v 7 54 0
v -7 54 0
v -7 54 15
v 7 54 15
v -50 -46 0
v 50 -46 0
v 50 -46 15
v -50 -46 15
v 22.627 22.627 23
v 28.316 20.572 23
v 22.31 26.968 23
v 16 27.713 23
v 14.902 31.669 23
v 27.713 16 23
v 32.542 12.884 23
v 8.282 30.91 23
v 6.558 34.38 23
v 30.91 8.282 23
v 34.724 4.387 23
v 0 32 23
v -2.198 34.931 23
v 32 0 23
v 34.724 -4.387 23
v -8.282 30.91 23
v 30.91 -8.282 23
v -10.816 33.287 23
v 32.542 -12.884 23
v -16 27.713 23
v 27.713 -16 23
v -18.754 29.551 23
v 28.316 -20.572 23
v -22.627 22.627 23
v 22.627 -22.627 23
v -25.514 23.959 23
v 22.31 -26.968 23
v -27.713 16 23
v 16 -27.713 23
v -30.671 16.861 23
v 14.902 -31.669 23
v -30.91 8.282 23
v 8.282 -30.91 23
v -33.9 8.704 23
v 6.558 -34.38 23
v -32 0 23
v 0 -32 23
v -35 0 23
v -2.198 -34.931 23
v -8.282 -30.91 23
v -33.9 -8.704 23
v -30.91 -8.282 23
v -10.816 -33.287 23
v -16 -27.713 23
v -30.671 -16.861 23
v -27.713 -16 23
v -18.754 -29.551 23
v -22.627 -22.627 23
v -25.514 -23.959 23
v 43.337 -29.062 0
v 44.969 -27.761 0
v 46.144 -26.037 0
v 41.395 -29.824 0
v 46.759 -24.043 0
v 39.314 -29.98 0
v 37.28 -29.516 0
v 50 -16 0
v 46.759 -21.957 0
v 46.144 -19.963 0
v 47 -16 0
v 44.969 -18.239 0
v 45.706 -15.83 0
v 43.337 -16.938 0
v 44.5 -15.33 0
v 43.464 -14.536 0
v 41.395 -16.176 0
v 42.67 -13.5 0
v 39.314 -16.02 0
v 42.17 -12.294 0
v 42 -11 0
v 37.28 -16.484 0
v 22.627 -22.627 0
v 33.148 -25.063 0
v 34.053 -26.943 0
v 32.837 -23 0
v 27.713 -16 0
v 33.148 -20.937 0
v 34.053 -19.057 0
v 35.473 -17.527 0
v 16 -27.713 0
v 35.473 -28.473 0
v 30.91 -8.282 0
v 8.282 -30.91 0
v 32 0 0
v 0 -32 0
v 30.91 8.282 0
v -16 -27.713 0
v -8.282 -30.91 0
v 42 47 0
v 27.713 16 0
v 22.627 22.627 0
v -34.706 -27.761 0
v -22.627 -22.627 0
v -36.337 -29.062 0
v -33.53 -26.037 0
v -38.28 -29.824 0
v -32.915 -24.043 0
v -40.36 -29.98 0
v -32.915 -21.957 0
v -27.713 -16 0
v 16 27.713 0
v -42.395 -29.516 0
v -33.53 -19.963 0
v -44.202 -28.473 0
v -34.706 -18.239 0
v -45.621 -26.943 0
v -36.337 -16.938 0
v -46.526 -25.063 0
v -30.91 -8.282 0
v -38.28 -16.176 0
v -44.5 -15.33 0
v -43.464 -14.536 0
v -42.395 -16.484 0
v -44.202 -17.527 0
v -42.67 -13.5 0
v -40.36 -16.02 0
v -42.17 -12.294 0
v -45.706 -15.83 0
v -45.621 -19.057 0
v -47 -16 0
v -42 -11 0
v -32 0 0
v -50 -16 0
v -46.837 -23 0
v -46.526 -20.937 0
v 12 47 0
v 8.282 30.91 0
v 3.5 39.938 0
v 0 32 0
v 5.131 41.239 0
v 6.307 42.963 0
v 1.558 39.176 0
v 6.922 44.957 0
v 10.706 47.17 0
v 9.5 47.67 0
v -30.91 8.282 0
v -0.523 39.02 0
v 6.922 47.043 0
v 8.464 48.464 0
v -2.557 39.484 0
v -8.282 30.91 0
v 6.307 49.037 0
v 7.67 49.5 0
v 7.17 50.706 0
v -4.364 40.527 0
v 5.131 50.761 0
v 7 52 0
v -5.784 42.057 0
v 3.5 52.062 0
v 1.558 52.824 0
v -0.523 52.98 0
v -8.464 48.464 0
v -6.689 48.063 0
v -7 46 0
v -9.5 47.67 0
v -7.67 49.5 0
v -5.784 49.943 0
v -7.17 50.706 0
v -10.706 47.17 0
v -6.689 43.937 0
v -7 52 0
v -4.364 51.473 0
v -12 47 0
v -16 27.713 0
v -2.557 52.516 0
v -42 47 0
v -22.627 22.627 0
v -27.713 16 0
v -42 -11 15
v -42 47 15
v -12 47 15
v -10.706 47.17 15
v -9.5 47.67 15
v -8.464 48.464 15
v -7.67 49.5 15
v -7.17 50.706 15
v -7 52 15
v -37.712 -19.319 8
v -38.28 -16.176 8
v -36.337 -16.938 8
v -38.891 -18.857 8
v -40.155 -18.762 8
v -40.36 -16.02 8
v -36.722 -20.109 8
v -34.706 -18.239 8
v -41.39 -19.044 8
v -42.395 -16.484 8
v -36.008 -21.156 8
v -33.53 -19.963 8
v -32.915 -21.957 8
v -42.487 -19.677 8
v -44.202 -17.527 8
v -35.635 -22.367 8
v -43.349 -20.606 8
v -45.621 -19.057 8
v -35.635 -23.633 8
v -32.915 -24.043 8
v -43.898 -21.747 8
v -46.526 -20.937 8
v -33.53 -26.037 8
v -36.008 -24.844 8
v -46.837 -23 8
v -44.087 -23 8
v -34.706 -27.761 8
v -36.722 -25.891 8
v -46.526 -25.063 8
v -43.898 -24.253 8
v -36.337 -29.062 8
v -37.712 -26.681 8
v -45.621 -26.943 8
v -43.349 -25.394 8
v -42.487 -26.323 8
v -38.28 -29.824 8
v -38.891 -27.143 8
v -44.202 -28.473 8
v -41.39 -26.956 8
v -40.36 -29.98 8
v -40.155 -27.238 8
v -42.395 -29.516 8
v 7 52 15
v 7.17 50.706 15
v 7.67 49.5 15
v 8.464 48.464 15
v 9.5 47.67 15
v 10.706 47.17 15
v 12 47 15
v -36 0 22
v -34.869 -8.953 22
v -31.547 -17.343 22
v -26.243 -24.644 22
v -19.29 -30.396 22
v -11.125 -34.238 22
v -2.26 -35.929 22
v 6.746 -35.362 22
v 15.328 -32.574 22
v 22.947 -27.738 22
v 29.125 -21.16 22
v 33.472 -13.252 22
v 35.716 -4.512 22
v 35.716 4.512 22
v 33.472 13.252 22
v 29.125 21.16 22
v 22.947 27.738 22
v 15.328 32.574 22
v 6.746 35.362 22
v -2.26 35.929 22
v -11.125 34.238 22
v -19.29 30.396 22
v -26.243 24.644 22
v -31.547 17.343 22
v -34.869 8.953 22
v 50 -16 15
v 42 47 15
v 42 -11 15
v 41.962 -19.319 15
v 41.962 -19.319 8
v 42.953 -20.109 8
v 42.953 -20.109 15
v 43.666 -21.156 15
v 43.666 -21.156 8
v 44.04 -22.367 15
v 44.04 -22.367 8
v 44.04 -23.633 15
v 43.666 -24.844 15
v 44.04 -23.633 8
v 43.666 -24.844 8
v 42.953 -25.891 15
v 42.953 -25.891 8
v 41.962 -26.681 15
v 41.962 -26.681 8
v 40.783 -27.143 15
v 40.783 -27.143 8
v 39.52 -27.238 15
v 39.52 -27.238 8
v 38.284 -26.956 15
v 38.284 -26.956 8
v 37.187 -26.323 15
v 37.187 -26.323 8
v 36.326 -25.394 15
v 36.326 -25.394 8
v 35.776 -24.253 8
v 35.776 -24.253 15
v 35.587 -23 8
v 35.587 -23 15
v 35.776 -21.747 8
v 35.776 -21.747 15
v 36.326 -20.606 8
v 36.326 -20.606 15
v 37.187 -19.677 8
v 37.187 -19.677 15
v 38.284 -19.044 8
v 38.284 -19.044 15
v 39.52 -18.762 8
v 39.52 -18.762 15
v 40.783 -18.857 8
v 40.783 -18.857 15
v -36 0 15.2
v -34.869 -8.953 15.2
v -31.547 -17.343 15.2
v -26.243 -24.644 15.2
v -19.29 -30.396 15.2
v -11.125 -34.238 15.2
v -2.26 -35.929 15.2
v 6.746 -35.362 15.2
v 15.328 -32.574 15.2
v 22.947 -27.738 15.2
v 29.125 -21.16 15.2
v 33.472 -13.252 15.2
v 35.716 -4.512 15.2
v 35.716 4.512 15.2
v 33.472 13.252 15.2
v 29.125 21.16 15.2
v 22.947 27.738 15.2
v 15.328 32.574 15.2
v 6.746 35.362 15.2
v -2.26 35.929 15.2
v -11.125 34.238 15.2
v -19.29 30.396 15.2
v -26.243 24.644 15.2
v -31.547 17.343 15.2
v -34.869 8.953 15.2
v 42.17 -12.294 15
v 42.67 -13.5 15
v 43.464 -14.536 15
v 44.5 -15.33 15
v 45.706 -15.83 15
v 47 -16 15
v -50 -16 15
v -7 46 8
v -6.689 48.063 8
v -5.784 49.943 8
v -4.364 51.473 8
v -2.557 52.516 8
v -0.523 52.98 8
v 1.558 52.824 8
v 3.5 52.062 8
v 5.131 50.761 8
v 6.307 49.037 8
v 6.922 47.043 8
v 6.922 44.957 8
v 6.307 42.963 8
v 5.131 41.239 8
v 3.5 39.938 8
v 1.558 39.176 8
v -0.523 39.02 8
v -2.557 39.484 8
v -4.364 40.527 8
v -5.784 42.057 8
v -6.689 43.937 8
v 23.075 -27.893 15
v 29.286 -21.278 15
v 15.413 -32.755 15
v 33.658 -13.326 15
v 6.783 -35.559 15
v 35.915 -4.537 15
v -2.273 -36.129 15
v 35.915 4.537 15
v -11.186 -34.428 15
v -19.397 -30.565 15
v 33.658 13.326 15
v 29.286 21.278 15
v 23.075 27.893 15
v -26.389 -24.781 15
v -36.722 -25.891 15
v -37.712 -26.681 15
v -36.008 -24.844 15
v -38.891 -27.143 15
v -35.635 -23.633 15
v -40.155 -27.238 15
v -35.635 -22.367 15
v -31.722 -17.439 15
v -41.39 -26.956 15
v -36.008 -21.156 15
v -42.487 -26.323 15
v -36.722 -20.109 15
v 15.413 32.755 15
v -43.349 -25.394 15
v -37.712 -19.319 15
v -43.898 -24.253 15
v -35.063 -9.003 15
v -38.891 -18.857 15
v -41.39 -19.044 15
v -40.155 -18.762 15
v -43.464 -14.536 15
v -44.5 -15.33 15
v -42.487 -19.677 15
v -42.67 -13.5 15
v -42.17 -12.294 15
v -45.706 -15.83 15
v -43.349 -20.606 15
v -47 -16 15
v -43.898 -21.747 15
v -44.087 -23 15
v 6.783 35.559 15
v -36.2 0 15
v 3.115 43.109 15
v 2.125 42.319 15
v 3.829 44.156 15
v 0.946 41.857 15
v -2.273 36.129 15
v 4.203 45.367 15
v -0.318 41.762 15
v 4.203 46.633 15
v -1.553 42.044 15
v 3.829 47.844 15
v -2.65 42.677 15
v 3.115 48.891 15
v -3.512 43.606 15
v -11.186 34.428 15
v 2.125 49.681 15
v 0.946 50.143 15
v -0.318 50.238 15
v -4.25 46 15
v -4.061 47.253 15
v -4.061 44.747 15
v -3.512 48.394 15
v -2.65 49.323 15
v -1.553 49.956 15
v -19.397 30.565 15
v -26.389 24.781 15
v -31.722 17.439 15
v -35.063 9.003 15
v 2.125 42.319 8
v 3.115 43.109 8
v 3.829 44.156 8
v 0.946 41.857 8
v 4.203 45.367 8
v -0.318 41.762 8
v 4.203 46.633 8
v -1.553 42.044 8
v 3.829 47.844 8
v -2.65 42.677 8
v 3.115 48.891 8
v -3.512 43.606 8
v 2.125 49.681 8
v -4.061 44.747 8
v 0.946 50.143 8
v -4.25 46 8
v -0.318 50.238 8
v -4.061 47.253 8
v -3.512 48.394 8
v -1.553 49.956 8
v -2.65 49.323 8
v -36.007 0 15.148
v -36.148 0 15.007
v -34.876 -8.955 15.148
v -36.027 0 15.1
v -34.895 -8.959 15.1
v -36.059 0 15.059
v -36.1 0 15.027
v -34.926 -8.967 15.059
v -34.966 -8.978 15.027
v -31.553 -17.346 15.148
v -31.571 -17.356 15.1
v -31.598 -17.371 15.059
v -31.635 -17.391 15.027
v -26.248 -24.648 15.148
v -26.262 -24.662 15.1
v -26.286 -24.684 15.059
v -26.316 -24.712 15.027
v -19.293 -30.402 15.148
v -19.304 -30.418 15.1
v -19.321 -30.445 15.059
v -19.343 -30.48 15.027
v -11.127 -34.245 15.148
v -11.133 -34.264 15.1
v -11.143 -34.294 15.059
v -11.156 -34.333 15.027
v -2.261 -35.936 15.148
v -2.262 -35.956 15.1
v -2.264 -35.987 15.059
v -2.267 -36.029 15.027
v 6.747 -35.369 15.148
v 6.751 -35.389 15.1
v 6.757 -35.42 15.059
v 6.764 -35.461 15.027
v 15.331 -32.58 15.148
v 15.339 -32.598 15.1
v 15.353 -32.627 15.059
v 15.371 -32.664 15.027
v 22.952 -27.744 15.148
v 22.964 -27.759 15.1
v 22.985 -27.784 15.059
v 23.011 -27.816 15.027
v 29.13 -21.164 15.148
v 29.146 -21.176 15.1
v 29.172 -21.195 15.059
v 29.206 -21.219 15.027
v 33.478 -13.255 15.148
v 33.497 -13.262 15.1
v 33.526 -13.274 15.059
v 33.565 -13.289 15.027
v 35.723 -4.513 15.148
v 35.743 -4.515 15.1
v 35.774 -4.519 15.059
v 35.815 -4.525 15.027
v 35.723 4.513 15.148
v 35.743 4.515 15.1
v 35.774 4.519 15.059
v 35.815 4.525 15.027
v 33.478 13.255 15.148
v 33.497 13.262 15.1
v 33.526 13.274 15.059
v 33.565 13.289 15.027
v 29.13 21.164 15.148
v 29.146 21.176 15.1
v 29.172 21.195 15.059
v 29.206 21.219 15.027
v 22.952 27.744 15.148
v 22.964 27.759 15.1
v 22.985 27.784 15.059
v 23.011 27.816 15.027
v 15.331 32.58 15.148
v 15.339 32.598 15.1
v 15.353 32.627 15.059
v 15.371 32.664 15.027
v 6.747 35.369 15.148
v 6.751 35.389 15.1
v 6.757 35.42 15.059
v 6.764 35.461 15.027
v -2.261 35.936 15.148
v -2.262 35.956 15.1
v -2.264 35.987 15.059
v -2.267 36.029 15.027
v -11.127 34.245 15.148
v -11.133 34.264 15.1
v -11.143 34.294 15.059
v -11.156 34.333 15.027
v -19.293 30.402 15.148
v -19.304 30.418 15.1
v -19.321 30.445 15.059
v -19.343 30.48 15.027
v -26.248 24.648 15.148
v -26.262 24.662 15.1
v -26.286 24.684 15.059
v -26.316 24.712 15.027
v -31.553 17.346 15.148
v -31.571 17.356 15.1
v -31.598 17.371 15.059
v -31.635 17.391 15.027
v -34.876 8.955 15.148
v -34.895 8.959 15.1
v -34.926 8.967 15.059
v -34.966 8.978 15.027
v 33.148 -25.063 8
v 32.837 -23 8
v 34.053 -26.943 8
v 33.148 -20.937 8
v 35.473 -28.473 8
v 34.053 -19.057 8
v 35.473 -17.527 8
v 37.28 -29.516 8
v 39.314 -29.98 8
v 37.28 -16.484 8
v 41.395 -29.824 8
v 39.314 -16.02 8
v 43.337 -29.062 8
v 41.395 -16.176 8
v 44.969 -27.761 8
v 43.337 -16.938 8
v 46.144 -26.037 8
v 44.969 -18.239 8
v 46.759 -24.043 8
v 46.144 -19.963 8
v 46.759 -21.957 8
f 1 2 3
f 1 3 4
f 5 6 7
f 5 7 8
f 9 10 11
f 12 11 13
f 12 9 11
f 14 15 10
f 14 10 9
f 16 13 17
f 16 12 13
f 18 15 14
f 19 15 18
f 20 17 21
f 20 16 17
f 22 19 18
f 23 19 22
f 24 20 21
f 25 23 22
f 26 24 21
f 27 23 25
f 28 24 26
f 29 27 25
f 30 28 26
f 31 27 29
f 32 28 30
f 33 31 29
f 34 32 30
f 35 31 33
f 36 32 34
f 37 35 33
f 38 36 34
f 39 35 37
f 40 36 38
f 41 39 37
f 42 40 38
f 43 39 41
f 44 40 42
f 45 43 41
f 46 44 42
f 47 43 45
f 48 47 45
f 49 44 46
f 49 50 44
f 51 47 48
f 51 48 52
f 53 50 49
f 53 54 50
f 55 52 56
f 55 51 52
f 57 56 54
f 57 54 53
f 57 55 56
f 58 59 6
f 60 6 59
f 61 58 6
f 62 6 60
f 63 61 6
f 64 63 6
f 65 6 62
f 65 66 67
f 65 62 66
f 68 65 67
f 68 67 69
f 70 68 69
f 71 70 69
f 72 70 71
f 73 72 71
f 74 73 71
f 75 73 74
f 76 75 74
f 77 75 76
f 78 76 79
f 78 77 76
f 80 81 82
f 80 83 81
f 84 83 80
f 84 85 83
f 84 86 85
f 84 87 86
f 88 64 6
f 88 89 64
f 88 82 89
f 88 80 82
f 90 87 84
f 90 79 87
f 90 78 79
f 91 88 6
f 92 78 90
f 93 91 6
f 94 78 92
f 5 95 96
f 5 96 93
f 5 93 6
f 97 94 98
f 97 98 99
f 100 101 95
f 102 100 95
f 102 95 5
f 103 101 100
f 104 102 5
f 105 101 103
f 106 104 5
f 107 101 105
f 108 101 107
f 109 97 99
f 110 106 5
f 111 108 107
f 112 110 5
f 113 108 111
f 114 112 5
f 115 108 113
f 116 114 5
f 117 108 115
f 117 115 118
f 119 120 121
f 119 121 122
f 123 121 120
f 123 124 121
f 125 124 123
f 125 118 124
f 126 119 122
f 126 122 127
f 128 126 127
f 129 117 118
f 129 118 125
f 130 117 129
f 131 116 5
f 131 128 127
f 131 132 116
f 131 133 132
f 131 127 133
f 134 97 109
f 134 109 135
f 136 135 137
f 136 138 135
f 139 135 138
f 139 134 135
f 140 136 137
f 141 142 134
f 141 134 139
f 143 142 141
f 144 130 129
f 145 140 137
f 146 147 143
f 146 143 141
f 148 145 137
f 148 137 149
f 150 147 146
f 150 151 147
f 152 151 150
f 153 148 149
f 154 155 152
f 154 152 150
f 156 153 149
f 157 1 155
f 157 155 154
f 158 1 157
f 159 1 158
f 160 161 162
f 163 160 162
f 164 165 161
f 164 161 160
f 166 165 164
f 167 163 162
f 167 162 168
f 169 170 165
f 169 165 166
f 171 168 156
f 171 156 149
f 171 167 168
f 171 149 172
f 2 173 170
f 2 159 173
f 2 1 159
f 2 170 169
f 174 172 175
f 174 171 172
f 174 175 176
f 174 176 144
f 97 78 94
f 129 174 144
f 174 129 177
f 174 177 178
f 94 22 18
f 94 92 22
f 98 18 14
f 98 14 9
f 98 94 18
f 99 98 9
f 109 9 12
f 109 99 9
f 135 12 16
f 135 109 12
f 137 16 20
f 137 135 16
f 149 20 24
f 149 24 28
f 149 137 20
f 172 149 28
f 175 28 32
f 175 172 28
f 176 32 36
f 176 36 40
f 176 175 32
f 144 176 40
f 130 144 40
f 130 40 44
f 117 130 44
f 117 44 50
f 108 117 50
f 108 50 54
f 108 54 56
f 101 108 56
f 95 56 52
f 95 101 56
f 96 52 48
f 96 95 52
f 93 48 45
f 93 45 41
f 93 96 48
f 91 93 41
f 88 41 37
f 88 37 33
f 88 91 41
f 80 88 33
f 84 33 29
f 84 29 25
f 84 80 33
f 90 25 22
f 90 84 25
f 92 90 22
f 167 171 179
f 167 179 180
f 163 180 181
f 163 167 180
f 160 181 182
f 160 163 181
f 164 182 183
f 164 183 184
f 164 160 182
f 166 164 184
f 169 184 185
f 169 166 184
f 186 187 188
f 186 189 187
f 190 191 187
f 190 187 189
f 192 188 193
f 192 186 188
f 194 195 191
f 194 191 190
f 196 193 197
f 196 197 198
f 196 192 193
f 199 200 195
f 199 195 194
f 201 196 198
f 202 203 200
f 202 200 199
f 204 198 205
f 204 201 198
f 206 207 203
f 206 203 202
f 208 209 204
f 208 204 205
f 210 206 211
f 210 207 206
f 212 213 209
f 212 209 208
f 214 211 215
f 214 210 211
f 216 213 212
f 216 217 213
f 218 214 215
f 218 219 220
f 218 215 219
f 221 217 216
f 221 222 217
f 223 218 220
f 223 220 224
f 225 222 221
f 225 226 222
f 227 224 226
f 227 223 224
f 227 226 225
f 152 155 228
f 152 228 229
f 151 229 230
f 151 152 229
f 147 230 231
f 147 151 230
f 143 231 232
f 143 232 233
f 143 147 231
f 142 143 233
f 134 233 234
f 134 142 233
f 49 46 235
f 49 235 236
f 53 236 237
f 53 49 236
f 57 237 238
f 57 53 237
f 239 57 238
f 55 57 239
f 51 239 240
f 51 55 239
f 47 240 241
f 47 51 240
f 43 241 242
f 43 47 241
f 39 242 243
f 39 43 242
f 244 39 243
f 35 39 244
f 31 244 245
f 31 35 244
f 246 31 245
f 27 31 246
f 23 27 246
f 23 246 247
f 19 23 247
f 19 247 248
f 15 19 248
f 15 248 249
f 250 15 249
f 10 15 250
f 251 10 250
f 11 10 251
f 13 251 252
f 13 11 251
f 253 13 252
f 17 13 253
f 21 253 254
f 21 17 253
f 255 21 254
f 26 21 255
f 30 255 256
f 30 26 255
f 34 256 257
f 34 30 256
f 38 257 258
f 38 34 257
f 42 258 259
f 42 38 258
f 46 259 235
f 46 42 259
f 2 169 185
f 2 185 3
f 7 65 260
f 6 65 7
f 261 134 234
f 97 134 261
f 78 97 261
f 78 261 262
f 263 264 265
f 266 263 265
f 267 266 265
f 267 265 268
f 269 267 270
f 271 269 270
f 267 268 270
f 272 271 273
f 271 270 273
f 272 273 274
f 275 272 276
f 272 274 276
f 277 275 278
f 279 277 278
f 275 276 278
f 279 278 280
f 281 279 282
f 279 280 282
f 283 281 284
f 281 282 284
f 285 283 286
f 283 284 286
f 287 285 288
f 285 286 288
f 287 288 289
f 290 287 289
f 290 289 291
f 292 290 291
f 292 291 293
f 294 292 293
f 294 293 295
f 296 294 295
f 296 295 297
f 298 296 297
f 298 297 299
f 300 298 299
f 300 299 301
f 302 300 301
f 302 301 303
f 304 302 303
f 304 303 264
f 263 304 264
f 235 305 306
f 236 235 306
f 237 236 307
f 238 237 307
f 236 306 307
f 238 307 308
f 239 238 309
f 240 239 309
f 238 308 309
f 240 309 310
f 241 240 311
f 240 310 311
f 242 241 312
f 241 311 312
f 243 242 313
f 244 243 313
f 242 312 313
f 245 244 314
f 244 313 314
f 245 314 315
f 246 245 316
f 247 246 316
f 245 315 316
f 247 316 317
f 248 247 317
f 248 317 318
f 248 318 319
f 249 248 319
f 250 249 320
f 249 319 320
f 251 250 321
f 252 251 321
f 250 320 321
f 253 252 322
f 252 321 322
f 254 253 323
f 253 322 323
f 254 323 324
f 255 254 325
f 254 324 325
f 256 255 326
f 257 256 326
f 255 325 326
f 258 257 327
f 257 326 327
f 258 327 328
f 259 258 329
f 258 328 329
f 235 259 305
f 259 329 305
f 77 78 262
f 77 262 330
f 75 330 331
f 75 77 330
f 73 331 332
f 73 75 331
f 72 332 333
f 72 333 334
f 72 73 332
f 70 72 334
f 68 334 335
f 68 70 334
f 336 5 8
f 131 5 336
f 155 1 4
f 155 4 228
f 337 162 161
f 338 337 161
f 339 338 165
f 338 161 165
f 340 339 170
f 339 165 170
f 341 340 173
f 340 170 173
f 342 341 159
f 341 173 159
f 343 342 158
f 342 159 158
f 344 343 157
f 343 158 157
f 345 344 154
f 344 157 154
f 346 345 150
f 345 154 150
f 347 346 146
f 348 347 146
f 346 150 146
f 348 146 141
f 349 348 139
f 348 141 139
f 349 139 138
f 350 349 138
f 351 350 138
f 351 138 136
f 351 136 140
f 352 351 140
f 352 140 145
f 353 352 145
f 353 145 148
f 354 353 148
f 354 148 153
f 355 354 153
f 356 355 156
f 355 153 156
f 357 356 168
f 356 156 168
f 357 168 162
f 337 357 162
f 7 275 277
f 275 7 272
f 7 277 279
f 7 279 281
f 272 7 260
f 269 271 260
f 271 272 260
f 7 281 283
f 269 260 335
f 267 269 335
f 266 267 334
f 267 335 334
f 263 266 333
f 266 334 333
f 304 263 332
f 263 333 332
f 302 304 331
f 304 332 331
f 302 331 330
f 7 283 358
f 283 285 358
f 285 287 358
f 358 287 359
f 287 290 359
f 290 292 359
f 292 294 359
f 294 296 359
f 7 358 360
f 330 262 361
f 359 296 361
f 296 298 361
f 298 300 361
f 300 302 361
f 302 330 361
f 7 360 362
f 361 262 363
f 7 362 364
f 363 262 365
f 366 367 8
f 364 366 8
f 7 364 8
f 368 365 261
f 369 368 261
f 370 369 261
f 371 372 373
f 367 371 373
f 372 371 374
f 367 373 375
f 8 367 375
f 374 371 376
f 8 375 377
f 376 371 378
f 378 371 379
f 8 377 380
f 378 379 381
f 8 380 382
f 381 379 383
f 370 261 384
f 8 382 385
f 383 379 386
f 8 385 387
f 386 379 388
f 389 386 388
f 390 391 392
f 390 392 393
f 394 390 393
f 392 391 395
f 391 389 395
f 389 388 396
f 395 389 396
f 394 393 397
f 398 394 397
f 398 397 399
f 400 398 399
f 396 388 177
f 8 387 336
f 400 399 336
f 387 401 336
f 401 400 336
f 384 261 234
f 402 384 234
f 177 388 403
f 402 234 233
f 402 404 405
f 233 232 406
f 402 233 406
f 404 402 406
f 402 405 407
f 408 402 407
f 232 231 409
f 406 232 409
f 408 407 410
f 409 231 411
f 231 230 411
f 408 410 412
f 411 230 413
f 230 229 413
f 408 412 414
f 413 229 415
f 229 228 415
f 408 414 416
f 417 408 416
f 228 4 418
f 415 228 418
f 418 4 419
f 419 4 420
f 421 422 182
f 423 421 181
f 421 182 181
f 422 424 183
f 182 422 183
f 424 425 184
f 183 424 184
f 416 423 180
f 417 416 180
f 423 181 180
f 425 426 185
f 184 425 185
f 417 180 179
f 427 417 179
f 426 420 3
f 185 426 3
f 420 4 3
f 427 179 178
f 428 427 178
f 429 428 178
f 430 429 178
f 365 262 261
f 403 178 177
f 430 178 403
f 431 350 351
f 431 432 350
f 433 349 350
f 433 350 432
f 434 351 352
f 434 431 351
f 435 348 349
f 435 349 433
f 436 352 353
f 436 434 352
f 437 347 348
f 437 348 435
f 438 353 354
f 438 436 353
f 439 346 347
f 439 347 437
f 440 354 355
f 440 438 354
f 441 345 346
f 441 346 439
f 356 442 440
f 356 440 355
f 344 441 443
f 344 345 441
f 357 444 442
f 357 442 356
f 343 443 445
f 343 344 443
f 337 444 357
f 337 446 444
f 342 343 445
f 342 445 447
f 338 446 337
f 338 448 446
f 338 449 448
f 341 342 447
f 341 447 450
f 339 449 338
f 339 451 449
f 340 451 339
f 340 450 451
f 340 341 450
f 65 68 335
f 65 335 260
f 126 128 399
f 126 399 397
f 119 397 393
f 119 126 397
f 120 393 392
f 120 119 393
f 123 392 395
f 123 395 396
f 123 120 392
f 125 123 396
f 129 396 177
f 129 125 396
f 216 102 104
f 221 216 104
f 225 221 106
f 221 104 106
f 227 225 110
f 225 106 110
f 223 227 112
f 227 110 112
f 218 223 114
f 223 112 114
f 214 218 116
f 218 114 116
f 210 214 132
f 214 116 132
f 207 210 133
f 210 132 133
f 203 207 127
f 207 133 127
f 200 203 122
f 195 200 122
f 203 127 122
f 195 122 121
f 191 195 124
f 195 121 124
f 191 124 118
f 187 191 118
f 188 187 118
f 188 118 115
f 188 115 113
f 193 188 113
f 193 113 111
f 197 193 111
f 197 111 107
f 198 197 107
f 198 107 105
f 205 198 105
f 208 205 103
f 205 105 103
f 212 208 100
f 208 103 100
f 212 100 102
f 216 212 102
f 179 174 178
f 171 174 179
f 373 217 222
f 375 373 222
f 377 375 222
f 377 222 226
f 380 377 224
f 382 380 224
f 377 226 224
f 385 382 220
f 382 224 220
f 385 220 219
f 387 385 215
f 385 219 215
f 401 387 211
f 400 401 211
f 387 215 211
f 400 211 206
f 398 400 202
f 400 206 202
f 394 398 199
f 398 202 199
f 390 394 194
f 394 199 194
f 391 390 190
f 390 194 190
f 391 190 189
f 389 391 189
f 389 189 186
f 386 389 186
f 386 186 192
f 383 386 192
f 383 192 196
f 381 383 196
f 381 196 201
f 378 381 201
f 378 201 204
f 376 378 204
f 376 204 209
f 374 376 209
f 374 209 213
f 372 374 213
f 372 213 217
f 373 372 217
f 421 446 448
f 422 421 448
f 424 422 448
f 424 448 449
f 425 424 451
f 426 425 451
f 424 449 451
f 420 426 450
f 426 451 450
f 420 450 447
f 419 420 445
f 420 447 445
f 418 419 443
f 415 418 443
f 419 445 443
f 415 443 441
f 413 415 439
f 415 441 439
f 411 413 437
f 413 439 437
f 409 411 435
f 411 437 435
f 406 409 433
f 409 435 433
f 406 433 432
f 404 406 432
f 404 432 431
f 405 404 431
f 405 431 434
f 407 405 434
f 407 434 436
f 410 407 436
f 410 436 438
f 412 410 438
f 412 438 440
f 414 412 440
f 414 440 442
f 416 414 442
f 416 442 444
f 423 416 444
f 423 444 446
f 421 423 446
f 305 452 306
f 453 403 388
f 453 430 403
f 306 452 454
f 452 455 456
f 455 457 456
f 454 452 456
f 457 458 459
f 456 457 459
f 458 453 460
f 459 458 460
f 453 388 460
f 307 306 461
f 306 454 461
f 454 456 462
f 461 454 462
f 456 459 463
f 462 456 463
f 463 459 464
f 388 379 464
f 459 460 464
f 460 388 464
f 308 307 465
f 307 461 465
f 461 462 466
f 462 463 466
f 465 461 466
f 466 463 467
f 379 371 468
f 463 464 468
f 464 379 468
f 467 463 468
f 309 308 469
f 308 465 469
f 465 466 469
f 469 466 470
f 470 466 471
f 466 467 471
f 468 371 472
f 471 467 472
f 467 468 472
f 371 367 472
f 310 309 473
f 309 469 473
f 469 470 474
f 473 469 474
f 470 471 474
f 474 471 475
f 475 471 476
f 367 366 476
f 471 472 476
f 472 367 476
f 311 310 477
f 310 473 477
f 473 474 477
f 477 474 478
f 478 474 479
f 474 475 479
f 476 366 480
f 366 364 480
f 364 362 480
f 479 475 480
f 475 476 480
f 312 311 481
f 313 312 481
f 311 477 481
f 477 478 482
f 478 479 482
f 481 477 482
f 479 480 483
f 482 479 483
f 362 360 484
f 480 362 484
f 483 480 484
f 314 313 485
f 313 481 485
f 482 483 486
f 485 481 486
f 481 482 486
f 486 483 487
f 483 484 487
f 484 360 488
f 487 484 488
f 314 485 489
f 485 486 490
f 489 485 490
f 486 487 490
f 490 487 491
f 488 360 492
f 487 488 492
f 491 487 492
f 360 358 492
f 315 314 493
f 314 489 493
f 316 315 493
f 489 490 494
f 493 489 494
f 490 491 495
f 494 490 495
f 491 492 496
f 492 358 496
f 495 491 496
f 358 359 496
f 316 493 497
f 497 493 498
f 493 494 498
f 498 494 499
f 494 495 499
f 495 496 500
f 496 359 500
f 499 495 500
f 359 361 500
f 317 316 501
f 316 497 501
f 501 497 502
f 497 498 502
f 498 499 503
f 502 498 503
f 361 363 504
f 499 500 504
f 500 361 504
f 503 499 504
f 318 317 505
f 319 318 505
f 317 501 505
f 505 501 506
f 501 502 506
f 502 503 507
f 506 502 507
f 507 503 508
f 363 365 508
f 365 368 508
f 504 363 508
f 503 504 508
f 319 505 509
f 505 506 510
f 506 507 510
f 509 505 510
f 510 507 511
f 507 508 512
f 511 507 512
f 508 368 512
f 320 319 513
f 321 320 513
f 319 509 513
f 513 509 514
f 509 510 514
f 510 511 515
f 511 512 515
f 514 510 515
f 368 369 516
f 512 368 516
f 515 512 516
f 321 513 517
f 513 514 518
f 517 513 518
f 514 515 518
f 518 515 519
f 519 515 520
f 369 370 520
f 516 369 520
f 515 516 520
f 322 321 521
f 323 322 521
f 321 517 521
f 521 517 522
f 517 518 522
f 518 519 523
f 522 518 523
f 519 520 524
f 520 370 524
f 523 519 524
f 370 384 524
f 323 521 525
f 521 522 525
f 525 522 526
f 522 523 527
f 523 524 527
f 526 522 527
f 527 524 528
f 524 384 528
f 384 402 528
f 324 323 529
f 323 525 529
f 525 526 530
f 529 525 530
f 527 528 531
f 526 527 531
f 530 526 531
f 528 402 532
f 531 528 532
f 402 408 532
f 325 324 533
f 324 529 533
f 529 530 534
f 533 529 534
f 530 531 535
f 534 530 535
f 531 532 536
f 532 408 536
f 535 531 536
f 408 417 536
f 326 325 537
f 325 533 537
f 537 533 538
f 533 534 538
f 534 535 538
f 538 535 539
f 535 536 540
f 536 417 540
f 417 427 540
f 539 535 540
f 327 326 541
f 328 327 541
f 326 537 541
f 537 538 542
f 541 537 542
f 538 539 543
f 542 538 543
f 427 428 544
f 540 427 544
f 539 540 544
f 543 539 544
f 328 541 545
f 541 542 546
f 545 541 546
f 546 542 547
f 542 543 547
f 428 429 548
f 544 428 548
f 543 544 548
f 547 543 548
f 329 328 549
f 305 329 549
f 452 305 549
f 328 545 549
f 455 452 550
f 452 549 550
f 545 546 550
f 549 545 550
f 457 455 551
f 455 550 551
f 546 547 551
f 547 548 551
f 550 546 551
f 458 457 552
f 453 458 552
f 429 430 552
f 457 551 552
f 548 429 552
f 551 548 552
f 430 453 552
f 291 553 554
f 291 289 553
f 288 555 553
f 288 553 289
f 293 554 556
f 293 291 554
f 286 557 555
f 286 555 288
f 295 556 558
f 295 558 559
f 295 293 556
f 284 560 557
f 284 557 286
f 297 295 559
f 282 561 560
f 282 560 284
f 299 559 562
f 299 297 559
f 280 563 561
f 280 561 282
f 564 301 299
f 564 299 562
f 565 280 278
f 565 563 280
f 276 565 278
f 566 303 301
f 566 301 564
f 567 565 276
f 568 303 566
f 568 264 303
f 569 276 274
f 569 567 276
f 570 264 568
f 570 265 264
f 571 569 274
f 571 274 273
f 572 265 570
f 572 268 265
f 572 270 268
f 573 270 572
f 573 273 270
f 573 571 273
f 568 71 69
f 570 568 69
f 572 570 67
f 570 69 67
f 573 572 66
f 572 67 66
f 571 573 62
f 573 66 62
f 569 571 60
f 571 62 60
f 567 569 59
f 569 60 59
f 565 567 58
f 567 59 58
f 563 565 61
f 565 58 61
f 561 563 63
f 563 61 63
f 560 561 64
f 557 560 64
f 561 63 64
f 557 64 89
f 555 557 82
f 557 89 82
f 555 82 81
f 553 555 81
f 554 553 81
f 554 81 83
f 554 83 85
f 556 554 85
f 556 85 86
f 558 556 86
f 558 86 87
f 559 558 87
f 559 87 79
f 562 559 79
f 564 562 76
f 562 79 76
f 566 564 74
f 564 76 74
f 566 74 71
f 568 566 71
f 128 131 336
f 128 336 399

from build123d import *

# Parameters (mm, degrees)
ESQUISSE1_R                  = 32
BOSS_EXTRU_1_DEPTH           = 15
ESQUISSE2_R                  = 36
ESQUISSE2_R_2                = 32
BOSS_EXTRU_2_DEPTH           = 8
CHANFREIN1_SIZE              = 1
CONG_1_R                     = 0.2
ESQUISSE3_R                  = 4.25
ENL_V_MAT_EXTRU_1_DEPTH      = 24
ESQUISSE4_R                  = 7
ENL_V_MAT_EXTRU_2_DEPTH      = 8
R_P_TITION_CIRCULAIRE1_COUNT = 3


with BuildPart() as part:
    # Esquisse1 → Boss.-Extru.1 (new body)
    with BuildSketch(Plane.XY):
        with BuildLine():
            Line((-7, 54), (7, 54))
            Line((7, 54), (7, 52))
            ThreePointArc((7, 52), (8.464466094, 48.464466094), (12, 47))
            Line((12, 47), (42, 47))
            Line((42, 47), (42, -11))
            ThreePointArc((42, -11), (43.464466094, -14.535533906), (47, -16))
            Line((47, -16), (50, -16))
            Line((50, -16), (50, -46))
            Line((50, -46), (-50, -46))
            Line((-50, -46), (-50, -16))
            Line((-50, -16), (-47, -16))
            ThreePointArc((-47, -16), (-43.464466094, -14.535533906), (-42, -11))
            Line((-42, -11), (-42, 47))
            Line((-42, 47), (-12, 47))
            ThreePointArc((-12, 47), (-8.464466094, 48.464466094), (-7, 52))
            Line((-7, 52), (-7, 54))
        make_face()
        Circle(ESQUISSE1_R, mode=Mode.SUBTRACT)
    extrude(amount=BOSS_EXTRU_1_DEPTH)

    # Esquisse2 → Boss.-Extru.2 (add)
    with BuildSketch(Plane.XY.offset(15)):
        with Locations(Location((0, 0, 0), (0, 0, 180))):  # turned: the seam where the file's is
            Circle(ESQUISSE2_R)
        Circle(ESQUISSE2_R_2, mode=Mode.SUBTRACT)
    extrude(amount=BOSS_EXTRU_2_DEPTH)

    # Chanfrein1
    chanfrein1_edges = [part.edges().sort_by_distance(p)[0] for p in [
        (36, 0, 23),
    ]]
    chamfer(chanfrein1_edges, length=CHANFREIN1_SIZE)

    # Congé1
    cong_1_edges = [part.edges().sort_by_distance(p)[0] for p in [
        (36, 0, 15),
    ]]
    fillet(cong_1_edges, radius=CONG_1_R)

    # Esquisse3 → Enlèv. mat.-Extru.1 (cut, through all)
    with BuildSketch(Plane(origin=(0, 0, 0), x_dir=(-1, 0, 0), z_dir=(0, 0, -1))):
        with Locations((0, 46)):
            Circle(ESQUISSE3_R)
    enl_v_mat_extru_1 = extrude(amount=-ENL_V_MAT_EXTRU_1_DEPTH, mode=Mode.SUBTRACT)

    # Esquisse4 → Enlèv. mat.-Extru.2 (cut)
    with BuildSketch(Plane(origin=(0, 0, 0), x_dir=(-1, 0, 0), z_dir=(0, 0, -1))):
        with Locations((0, 46)):
            Circle(ESQUISSE4_R)
    enl_v_mat_extru_2 = extrude(amount=-ENL_V_MAT_EXTRU_2_DEPTH, mode=Mode.SUBTRACT)

    # Répétition circulaire1: Enlèv. mat.-Extru.1, Enlèv. mat.-Extru.2 ×3 about axis
    r_p_tition_circulaire1_axis = Axis((0, 0, 0), (0, 0, 1))
    add([enl_v_mat_extru_1.rotate(r_p_tition_circulaire1_axis, i * 360 / R_P_TITION_CIRCULAIRE1_COUNT) for i in range(1, R_P_TITION_CIRCULAIRE1_COUNT)], mode=Mode.SUBTRACT)
    add([enl_v_mat_extru_2.rotate(r_p_tition_circulaire1_axis, i * 360 / R_P_TITION_CIRCULAIRE1_COUNT) for i in range(1, R_P_TITION_CIRCULAIRE1_COUNT)], mode=Mode.SUBTRACT)


solid = part.part
